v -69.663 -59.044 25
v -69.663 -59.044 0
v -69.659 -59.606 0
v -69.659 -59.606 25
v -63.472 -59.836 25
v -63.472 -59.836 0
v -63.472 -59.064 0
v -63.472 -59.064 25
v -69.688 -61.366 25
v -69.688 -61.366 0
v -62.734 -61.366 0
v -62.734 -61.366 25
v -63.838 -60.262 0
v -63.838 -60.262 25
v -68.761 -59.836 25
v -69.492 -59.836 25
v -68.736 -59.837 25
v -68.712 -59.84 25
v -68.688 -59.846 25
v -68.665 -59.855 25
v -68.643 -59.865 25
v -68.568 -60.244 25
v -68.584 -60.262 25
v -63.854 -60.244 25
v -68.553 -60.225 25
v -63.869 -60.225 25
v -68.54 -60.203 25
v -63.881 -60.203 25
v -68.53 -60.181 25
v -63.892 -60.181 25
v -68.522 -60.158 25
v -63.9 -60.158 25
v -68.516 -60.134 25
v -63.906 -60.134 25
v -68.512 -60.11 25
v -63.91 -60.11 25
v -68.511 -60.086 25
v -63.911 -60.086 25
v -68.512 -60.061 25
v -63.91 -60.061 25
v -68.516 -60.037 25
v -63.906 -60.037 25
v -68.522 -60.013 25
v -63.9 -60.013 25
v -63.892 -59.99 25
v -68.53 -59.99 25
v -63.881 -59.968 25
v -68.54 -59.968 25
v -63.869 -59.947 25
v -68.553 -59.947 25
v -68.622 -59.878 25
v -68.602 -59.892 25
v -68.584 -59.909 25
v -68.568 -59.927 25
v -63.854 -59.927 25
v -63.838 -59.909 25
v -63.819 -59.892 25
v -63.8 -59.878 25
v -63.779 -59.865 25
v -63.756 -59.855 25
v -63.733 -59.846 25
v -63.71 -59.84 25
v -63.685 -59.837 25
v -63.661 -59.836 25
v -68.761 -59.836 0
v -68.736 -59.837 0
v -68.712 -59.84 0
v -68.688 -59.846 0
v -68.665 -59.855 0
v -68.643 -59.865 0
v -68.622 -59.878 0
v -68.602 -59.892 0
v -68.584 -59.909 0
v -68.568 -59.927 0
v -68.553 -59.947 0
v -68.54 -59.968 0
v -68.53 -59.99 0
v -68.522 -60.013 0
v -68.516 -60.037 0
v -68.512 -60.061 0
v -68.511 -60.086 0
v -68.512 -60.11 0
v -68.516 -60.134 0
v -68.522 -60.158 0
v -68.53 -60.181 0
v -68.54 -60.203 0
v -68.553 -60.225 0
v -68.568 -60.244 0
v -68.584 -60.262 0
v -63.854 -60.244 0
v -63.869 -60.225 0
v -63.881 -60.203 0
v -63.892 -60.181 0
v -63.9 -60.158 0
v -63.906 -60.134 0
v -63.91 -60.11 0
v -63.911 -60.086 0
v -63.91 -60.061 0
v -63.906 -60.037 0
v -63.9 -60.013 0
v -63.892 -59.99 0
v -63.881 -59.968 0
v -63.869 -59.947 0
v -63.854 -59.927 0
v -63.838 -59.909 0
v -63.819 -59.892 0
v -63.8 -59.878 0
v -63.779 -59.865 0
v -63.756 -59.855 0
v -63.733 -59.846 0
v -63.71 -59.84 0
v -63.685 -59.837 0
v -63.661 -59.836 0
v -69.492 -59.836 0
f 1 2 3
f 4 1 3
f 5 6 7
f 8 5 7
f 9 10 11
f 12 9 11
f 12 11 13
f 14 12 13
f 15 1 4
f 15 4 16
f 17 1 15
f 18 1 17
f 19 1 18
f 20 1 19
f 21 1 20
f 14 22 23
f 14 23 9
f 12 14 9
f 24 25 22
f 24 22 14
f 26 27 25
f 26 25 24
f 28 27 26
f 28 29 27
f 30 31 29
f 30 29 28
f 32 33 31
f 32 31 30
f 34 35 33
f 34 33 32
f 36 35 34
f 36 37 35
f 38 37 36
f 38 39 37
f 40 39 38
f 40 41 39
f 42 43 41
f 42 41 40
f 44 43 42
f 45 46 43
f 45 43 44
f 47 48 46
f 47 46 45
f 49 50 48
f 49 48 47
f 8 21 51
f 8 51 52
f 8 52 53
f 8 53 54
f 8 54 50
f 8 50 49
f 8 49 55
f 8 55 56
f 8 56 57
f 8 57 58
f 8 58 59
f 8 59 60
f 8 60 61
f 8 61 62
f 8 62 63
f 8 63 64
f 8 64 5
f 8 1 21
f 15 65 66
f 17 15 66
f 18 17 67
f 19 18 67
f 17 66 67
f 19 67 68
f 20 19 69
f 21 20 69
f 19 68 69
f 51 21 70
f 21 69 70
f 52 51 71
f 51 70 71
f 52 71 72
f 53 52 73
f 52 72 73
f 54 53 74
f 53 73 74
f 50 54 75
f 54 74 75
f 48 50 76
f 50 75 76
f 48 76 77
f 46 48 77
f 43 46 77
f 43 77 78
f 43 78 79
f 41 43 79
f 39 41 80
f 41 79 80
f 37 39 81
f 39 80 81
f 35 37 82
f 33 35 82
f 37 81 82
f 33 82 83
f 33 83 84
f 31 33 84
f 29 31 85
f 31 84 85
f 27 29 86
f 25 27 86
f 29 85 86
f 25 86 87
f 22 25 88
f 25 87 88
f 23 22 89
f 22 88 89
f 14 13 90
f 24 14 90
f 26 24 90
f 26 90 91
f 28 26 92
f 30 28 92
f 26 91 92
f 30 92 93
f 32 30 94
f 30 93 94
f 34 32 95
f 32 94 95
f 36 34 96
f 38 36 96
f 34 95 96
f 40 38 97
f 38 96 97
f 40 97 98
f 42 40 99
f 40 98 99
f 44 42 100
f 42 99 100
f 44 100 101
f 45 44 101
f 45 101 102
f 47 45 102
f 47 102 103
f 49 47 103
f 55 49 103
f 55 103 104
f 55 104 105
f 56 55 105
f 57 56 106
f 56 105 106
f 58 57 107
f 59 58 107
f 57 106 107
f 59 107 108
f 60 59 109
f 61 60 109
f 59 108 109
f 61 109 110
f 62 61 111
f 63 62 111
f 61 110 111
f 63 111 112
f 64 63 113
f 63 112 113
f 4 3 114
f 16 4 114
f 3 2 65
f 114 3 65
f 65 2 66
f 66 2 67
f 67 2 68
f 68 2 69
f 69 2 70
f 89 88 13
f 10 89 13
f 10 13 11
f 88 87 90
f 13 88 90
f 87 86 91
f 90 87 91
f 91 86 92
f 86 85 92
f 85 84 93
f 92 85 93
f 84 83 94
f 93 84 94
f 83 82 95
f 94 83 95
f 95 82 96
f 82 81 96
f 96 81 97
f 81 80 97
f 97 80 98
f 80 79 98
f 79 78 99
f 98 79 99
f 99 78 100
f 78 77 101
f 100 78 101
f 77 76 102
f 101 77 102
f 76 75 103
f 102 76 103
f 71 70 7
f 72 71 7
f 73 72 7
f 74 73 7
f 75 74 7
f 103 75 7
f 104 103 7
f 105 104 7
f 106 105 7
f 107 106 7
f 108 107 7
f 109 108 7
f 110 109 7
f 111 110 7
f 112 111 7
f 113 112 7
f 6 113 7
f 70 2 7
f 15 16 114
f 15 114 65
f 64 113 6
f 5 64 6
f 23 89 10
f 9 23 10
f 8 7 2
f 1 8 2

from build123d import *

# Parameters (mm, degrees)
F1_DEPTH = 25


# Not quite as in the source:
# - ends of sketch curves that miss each other by under 0.0002 mm in the source are joined


with BuildPart() as f1:
    # F0 (on Top) → F1 (new body)
    with BuildSketch(Plane.XY):
        with BuildLine():
            ThreePointArc((-68.7608035324, -59.8356334478), (-68.5298336492, -59.9899625897), (-68.5840268371, -60.2624101431))
            Line((-68.5840268371, -60.2624101431), (-69.6879495324, -61.3663324478))
            Line((-69.6879495324, -61.3663324478), (-62.7336575324, -61.3663328727))
            Line((-62.7336575324, -61.3663328727), (-63.8375805324, -60.2624108727))
            ThreePointArc((-63.8375805324, -60.2624108727), (-63.8917734155, -59.9899625897), (-63.6608035324, -59.8356334478))
            Line((-63.6608035324, -59.8356334478), (-63.4718790681, -59.8356334478))
            Line((-63.4718790681, -59.8356334478), (-63.4718790681, -59.0644426644))
            Line((-63.4718790681, -59.0644426644), (-69.6627650617, -59.0439311215))
            Line((-69.6627650617, -59.0439311215), (-69.6587313915, -59.6062613089))
            Line((-69.6587313915, -59.6062613089), (-69.491799647, -59.8356334478))
            Line((-69.491799647, -59.8356334478), (-68.7608035324, -59.8356334478))
        make_face()
    extrude(amount=F1_DEPTH)


solid = f1.part
